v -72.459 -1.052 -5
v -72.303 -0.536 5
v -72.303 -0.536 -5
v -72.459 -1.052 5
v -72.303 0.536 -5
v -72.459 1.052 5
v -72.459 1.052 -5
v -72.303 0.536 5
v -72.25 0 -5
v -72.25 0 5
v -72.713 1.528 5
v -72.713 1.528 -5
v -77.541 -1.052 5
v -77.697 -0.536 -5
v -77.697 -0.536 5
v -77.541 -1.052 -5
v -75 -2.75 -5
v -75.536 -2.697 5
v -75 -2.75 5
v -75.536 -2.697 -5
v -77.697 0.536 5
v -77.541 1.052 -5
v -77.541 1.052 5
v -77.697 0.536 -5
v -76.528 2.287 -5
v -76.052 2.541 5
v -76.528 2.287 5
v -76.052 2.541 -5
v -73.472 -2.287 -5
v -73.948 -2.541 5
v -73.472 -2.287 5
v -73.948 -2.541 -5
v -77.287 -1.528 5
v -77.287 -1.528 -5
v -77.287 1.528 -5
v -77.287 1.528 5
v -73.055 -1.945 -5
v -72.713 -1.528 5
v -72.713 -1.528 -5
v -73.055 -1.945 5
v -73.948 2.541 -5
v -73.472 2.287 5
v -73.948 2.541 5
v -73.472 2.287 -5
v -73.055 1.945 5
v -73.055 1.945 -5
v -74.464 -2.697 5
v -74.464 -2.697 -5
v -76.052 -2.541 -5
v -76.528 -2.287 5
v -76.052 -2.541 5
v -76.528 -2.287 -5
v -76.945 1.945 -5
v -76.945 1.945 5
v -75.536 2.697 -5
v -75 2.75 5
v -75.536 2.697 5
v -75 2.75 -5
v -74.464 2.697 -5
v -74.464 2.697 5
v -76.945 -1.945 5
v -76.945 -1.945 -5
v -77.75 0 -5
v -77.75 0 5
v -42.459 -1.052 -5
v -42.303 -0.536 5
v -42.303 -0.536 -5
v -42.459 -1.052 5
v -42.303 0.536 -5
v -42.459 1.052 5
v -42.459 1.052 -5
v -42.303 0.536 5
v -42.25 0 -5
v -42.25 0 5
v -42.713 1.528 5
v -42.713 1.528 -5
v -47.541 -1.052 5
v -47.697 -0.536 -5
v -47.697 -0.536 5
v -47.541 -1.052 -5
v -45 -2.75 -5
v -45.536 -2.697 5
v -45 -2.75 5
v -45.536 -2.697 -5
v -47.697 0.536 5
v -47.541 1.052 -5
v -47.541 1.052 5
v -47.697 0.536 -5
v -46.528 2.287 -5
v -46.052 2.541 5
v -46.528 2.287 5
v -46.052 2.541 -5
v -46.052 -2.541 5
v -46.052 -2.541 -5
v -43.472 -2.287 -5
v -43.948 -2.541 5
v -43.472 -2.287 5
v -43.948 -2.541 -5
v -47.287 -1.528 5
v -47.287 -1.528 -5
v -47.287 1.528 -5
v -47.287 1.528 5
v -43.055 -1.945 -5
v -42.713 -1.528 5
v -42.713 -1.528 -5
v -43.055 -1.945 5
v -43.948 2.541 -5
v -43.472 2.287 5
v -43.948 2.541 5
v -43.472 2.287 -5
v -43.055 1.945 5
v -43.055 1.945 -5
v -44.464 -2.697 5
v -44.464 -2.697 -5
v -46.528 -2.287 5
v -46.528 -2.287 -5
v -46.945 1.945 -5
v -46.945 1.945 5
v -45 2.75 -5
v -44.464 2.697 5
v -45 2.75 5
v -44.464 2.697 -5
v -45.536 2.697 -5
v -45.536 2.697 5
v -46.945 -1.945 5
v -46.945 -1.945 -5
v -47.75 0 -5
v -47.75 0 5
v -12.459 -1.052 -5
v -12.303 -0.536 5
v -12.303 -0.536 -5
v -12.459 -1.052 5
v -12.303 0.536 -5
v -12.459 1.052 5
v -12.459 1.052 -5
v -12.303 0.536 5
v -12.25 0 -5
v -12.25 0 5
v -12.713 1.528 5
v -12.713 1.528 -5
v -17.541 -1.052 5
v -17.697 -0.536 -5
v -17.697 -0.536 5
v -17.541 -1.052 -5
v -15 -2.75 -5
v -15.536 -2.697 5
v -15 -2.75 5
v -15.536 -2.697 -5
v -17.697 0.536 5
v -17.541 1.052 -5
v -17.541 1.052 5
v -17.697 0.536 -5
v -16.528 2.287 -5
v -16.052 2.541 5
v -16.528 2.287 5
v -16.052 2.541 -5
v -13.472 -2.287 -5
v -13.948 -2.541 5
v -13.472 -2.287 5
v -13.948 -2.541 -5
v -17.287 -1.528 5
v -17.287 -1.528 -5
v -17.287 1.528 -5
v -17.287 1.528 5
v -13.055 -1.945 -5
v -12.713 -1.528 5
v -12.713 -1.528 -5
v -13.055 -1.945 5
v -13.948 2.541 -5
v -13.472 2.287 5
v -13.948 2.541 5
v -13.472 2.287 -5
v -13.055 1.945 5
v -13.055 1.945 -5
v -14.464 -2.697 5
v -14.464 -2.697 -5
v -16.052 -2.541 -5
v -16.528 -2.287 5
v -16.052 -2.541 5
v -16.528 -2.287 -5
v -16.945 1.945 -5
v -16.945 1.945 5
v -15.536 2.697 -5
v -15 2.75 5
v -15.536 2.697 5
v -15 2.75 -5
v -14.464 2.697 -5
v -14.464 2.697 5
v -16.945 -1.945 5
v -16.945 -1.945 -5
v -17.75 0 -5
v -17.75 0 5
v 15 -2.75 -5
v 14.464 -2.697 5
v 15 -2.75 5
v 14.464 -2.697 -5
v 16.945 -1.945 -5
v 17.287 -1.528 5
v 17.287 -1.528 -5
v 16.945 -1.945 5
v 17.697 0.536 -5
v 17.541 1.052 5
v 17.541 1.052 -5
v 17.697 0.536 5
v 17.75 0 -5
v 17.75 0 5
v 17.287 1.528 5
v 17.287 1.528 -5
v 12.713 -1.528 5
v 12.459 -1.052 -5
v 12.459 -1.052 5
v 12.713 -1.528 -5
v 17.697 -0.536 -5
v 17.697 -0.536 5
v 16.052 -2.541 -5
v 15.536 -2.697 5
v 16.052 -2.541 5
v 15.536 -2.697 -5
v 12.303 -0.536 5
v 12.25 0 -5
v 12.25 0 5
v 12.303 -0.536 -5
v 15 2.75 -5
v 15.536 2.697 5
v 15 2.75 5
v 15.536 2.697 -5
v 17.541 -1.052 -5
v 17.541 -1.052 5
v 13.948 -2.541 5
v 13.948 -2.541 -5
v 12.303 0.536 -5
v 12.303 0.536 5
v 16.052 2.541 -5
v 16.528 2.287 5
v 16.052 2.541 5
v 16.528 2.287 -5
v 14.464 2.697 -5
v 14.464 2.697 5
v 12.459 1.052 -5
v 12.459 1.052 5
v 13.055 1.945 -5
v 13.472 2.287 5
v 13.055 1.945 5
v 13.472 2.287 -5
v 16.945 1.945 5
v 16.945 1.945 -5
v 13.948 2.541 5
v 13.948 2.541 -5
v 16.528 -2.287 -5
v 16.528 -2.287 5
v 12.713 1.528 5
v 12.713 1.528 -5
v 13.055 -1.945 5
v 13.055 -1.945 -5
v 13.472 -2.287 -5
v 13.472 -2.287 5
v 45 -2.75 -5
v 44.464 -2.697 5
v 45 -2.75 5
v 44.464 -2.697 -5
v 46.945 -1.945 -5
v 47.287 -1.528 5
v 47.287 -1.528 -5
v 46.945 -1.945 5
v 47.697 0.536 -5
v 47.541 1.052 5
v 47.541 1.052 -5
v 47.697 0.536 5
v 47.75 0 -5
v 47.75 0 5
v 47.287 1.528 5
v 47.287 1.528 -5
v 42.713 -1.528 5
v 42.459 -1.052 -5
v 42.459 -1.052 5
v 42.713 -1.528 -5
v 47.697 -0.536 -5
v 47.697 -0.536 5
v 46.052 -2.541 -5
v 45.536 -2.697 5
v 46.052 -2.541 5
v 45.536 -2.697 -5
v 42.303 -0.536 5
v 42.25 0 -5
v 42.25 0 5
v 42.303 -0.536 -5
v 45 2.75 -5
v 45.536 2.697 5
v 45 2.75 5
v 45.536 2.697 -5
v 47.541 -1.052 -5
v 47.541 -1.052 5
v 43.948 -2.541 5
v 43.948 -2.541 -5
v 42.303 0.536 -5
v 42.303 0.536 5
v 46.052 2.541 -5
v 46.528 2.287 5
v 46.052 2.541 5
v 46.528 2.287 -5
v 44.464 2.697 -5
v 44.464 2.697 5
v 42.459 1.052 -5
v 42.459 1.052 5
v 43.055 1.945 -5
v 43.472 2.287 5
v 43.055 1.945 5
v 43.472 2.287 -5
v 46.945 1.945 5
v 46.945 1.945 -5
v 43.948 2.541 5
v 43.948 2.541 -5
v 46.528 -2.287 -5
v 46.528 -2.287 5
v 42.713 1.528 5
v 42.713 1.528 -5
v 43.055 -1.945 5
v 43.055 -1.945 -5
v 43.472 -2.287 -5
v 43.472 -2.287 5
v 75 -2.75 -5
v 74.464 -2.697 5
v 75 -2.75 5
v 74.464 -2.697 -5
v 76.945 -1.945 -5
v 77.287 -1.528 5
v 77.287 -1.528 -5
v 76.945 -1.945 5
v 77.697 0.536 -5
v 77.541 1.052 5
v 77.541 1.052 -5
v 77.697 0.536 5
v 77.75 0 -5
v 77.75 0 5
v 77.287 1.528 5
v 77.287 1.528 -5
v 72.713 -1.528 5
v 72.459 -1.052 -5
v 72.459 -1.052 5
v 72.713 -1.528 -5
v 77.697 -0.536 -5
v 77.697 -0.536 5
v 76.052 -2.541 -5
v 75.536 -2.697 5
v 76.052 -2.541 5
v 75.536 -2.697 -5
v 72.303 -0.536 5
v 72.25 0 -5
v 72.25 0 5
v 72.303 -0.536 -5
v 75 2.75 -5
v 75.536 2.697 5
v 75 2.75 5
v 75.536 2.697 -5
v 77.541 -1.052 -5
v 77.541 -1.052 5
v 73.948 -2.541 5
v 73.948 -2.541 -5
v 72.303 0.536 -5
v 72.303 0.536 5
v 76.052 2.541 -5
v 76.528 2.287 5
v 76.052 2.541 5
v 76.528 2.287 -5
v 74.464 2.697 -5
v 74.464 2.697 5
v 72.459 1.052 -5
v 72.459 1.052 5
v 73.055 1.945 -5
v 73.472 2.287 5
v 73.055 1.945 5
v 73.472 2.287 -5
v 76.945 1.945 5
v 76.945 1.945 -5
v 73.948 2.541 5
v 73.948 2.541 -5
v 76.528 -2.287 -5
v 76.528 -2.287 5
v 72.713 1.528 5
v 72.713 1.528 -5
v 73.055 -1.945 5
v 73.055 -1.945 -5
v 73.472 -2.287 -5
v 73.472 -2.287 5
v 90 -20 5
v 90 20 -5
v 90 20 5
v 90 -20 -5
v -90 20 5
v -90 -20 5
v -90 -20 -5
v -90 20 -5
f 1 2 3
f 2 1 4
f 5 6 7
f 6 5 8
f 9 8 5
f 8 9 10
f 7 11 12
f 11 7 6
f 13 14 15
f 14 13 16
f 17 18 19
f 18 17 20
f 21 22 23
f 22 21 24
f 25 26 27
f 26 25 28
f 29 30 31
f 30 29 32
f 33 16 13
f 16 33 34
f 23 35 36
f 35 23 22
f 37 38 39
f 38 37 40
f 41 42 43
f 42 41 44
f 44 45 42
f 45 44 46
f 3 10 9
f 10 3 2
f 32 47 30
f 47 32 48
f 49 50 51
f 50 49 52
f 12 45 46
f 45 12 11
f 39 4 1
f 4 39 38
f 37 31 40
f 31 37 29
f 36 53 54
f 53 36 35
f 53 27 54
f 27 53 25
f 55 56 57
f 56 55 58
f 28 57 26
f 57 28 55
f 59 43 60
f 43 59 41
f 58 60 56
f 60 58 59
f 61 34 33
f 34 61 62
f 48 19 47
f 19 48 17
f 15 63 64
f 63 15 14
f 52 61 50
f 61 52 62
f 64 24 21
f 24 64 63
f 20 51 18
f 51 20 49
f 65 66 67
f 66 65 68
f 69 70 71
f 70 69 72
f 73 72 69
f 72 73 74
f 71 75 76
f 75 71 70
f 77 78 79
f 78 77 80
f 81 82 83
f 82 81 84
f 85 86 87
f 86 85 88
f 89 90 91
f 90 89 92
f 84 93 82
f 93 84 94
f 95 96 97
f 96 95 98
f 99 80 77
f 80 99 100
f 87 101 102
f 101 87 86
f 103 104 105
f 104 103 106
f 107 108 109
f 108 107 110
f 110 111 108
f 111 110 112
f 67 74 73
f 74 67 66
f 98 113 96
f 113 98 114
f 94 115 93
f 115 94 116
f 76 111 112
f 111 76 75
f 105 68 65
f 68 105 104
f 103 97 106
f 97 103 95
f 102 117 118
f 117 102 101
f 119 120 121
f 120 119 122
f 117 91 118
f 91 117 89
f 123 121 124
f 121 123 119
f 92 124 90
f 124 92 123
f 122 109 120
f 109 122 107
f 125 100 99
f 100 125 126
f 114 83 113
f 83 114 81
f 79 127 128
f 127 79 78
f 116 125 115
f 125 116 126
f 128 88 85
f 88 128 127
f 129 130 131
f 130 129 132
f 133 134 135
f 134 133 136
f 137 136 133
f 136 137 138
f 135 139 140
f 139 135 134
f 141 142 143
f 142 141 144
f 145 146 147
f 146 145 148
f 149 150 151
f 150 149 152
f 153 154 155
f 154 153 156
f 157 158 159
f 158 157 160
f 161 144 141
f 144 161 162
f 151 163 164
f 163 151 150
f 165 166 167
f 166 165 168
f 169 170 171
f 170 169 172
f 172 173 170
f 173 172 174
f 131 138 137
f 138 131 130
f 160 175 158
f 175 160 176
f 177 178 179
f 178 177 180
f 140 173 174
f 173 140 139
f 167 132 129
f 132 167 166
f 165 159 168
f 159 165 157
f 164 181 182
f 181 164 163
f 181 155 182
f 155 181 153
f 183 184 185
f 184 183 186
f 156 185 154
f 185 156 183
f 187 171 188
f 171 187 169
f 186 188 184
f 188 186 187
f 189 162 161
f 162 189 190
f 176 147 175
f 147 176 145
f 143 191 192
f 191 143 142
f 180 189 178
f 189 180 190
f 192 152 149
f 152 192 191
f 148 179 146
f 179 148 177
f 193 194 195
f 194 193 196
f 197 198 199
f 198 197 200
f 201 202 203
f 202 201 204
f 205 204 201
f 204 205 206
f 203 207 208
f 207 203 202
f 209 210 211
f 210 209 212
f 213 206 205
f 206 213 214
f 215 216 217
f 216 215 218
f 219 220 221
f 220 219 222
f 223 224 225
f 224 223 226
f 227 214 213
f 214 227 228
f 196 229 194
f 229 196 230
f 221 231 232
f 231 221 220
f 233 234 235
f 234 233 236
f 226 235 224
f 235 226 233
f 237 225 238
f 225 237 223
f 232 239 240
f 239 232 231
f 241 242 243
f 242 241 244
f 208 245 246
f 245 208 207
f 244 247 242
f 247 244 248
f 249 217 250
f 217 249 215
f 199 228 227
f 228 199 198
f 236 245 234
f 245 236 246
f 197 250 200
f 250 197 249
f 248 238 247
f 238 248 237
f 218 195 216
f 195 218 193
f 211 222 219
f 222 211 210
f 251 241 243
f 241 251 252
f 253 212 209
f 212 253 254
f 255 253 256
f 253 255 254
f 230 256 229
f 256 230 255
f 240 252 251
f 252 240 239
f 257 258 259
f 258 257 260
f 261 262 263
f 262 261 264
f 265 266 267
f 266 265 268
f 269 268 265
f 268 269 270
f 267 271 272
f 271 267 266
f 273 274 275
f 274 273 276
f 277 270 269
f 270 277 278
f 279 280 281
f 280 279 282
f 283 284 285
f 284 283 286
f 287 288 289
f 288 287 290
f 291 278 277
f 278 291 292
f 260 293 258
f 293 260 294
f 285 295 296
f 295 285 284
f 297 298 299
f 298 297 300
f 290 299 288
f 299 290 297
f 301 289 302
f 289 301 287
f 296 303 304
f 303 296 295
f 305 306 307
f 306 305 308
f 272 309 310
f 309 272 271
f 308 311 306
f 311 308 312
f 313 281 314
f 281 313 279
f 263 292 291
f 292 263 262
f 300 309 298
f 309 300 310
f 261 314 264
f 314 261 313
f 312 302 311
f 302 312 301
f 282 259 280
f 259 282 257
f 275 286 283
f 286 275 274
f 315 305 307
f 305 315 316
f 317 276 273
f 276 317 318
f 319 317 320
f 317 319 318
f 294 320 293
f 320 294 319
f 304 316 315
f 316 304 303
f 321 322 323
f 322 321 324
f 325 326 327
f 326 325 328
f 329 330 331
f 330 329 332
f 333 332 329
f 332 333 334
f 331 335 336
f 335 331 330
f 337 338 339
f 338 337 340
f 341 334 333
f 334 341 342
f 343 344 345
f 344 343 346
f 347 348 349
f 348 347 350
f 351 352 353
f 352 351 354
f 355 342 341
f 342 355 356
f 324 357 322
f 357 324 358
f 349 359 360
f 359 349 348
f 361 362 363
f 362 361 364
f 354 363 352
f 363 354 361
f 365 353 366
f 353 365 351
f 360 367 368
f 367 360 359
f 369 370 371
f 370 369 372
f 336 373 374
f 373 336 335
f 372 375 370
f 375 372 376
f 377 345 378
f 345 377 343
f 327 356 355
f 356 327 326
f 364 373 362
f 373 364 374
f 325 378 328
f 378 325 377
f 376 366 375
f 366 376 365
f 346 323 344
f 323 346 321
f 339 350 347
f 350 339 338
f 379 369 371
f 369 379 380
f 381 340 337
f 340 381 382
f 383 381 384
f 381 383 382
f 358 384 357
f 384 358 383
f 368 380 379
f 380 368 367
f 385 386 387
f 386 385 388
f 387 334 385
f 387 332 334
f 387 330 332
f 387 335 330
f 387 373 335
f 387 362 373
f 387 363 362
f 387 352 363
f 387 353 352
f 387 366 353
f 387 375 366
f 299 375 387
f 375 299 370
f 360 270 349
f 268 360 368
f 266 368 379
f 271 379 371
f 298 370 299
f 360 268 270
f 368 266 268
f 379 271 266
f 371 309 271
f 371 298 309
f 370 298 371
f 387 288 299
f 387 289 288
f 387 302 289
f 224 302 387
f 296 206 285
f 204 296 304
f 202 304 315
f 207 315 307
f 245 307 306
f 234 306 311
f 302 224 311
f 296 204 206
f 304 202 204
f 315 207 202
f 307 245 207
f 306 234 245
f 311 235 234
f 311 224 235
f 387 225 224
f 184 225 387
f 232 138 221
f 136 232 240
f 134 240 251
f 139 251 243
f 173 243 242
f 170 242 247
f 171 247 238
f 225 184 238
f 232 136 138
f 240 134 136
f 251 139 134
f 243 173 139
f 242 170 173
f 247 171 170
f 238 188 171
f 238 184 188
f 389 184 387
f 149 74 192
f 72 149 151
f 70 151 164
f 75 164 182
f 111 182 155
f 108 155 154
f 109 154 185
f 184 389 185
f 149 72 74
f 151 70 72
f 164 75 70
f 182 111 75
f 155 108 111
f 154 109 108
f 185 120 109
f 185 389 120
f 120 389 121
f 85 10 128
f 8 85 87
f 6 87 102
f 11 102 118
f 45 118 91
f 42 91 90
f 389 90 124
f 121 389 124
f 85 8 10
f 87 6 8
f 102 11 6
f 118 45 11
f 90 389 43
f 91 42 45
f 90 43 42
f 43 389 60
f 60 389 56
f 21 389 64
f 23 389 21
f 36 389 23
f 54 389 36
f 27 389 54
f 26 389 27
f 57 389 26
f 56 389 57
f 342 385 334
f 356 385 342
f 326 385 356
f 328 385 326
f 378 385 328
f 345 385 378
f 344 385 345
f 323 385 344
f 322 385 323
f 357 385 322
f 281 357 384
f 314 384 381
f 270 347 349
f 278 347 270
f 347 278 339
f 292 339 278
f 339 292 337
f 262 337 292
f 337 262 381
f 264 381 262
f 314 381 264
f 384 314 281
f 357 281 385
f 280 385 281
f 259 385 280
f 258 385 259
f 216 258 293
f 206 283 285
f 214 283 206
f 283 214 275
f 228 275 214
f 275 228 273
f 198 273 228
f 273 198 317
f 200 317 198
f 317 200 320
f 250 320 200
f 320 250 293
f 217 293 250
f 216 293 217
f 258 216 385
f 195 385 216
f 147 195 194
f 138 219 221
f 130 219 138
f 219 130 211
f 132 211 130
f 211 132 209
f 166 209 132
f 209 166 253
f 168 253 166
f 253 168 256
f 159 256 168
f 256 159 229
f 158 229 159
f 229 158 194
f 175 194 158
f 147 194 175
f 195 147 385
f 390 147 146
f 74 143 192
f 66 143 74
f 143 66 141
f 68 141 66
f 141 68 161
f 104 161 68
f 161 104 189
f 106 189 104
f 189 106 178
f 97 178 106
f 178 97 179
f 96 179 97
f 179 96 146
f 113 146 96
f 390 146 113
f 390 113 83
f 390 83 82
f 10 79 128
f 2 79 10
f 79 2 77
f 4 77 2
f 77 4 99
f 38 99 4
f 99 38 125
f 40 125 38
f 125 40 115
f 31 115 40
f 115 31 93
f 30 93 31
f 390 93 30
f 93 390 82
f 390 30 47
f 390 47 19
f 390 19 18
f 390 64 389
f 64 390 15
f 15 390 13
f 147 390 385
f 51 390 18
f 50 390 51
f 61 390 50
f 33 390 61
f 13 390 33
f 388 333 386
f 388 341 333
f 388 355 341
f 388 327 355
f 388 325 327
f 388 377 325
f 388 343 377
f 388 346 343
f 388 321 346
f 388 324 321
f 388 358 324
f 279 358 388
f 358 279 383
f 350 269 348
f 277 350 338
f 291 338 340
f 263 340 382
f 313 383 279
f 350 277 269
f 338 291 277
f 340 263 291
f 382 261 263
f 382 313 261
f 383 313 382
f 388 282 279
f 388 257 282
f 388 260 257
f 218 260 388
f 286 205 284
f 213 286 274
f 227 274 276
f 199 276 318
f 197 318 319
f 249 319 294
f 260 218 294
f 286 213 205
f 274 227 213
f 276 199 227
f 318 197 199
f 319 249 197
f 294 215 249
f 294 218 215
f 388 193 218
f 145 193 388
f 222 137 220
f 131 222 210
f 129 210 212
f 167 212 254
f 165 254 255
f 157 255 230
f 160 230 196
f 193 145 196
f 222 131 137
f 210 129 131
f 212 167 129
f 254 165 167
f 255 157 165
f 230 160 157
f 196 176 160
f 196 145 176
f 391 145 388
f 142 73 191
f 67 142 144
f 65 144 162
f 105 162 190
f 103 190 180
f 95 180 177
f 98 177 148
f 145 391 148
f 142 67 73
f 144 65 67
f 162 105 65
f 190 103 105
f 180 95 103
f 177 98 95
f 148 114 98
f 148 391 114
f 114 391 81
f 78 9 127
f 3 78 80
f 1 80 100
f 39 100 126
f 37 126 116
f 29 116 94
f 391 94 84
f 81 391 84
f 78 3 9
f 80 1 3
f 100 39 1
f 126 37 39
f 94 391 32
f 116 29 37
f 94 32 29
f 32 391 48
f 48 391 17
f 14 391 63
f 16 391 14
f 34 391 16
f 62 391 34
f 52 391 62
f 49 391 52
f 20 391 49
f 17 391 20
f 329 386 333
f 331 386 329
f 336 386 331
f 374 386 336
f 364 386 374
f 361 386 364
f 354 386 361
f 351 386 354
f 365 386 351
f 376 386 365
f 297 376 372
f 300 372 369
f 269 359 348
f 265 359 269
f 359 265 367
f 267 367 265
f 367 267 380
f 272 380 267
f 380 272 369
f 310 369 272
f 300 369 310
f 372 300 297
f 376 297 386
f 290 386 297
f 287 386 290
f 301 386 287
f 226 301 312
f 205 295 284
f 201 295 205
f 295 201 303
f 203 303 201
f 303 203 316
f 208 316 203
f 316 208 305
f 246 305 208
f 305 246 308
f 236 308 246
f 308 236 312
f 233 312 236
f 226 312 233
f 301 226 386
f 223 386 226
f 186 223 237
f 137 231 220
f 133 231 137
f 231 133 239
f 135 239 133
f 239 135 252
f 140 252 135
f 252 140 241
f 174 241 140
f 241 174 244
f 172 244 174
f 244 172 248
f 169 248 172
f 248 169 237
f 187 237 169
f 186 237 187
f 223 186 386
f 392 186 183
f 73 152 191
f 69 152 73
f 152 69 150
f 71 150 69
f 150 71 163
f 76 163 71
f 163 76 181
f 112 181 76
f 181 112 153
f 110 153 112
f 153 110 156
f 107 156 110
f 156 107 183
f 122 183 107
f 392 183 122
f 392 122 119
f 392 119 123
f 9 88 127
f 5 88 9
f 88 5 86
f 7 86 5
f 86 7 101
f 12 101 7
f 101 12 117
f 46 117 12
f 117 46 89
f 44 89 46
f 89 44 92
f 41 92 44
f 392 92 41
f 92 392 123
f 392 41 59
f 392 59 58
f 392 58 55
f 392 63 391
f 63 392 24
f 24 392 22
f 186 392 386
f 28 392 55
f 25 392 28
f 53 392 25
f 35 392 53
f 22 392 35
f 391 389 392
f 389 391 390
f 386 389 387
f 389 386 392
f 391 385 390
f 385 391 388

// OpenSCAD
$fn = 32;

// ----------------------------------------------------------------------
// Hole bar, 6 x Ø5.5
// skip layout, 15 mm edge offset
// ----------------------------------------------------------------------

// --- parameters (mm) ---
bar_w = 40;       // bar width (Y)
bar_t = 10;       // bar thickness (Z)
holes = 6;        // holes per row
hole_d = 5.5;     // hole diameter
edge = 15;        // offset from the bar end to the first hole
grid_pitch = 15;  // grid the bar was laid out on

// --- derived feature positions (mm) ---
pitch = grid_pitch * 2;       // = 30   holes sit every other grid slot
span = (holes - 1) * pitch;   // = 150   distance between the end holes
bar_l = span + 2 * edge;      // = 180   overall bar length
start_x = -bar_l / 2 + edge;  // = -75   X of the first hole
feature_centers = [
  [start_x + 0 * pitch, 0],
  [start_x + 1 * pitch, 0],
  [start_x + 2 * pitch, 0],
  [start_x + 3 * pitch, 0],
  [start_x + 4 * pitch, 0],
  [start_x + 5 * pitch, 0]
];   // hole centres of the first row

// bar with one row of holes, drilled from feature_centers
difference() {
  translate([-bar_l / 2, -bar_w / 2, -bar_t / 2]) cube([bar_l, bar_w, bar_t]);
  for (centre = feature_centers)
    translate([centre[0], centre[1], 0])
      cylinder(d = hole_d, h = bar_t + 2, center = true);
}
